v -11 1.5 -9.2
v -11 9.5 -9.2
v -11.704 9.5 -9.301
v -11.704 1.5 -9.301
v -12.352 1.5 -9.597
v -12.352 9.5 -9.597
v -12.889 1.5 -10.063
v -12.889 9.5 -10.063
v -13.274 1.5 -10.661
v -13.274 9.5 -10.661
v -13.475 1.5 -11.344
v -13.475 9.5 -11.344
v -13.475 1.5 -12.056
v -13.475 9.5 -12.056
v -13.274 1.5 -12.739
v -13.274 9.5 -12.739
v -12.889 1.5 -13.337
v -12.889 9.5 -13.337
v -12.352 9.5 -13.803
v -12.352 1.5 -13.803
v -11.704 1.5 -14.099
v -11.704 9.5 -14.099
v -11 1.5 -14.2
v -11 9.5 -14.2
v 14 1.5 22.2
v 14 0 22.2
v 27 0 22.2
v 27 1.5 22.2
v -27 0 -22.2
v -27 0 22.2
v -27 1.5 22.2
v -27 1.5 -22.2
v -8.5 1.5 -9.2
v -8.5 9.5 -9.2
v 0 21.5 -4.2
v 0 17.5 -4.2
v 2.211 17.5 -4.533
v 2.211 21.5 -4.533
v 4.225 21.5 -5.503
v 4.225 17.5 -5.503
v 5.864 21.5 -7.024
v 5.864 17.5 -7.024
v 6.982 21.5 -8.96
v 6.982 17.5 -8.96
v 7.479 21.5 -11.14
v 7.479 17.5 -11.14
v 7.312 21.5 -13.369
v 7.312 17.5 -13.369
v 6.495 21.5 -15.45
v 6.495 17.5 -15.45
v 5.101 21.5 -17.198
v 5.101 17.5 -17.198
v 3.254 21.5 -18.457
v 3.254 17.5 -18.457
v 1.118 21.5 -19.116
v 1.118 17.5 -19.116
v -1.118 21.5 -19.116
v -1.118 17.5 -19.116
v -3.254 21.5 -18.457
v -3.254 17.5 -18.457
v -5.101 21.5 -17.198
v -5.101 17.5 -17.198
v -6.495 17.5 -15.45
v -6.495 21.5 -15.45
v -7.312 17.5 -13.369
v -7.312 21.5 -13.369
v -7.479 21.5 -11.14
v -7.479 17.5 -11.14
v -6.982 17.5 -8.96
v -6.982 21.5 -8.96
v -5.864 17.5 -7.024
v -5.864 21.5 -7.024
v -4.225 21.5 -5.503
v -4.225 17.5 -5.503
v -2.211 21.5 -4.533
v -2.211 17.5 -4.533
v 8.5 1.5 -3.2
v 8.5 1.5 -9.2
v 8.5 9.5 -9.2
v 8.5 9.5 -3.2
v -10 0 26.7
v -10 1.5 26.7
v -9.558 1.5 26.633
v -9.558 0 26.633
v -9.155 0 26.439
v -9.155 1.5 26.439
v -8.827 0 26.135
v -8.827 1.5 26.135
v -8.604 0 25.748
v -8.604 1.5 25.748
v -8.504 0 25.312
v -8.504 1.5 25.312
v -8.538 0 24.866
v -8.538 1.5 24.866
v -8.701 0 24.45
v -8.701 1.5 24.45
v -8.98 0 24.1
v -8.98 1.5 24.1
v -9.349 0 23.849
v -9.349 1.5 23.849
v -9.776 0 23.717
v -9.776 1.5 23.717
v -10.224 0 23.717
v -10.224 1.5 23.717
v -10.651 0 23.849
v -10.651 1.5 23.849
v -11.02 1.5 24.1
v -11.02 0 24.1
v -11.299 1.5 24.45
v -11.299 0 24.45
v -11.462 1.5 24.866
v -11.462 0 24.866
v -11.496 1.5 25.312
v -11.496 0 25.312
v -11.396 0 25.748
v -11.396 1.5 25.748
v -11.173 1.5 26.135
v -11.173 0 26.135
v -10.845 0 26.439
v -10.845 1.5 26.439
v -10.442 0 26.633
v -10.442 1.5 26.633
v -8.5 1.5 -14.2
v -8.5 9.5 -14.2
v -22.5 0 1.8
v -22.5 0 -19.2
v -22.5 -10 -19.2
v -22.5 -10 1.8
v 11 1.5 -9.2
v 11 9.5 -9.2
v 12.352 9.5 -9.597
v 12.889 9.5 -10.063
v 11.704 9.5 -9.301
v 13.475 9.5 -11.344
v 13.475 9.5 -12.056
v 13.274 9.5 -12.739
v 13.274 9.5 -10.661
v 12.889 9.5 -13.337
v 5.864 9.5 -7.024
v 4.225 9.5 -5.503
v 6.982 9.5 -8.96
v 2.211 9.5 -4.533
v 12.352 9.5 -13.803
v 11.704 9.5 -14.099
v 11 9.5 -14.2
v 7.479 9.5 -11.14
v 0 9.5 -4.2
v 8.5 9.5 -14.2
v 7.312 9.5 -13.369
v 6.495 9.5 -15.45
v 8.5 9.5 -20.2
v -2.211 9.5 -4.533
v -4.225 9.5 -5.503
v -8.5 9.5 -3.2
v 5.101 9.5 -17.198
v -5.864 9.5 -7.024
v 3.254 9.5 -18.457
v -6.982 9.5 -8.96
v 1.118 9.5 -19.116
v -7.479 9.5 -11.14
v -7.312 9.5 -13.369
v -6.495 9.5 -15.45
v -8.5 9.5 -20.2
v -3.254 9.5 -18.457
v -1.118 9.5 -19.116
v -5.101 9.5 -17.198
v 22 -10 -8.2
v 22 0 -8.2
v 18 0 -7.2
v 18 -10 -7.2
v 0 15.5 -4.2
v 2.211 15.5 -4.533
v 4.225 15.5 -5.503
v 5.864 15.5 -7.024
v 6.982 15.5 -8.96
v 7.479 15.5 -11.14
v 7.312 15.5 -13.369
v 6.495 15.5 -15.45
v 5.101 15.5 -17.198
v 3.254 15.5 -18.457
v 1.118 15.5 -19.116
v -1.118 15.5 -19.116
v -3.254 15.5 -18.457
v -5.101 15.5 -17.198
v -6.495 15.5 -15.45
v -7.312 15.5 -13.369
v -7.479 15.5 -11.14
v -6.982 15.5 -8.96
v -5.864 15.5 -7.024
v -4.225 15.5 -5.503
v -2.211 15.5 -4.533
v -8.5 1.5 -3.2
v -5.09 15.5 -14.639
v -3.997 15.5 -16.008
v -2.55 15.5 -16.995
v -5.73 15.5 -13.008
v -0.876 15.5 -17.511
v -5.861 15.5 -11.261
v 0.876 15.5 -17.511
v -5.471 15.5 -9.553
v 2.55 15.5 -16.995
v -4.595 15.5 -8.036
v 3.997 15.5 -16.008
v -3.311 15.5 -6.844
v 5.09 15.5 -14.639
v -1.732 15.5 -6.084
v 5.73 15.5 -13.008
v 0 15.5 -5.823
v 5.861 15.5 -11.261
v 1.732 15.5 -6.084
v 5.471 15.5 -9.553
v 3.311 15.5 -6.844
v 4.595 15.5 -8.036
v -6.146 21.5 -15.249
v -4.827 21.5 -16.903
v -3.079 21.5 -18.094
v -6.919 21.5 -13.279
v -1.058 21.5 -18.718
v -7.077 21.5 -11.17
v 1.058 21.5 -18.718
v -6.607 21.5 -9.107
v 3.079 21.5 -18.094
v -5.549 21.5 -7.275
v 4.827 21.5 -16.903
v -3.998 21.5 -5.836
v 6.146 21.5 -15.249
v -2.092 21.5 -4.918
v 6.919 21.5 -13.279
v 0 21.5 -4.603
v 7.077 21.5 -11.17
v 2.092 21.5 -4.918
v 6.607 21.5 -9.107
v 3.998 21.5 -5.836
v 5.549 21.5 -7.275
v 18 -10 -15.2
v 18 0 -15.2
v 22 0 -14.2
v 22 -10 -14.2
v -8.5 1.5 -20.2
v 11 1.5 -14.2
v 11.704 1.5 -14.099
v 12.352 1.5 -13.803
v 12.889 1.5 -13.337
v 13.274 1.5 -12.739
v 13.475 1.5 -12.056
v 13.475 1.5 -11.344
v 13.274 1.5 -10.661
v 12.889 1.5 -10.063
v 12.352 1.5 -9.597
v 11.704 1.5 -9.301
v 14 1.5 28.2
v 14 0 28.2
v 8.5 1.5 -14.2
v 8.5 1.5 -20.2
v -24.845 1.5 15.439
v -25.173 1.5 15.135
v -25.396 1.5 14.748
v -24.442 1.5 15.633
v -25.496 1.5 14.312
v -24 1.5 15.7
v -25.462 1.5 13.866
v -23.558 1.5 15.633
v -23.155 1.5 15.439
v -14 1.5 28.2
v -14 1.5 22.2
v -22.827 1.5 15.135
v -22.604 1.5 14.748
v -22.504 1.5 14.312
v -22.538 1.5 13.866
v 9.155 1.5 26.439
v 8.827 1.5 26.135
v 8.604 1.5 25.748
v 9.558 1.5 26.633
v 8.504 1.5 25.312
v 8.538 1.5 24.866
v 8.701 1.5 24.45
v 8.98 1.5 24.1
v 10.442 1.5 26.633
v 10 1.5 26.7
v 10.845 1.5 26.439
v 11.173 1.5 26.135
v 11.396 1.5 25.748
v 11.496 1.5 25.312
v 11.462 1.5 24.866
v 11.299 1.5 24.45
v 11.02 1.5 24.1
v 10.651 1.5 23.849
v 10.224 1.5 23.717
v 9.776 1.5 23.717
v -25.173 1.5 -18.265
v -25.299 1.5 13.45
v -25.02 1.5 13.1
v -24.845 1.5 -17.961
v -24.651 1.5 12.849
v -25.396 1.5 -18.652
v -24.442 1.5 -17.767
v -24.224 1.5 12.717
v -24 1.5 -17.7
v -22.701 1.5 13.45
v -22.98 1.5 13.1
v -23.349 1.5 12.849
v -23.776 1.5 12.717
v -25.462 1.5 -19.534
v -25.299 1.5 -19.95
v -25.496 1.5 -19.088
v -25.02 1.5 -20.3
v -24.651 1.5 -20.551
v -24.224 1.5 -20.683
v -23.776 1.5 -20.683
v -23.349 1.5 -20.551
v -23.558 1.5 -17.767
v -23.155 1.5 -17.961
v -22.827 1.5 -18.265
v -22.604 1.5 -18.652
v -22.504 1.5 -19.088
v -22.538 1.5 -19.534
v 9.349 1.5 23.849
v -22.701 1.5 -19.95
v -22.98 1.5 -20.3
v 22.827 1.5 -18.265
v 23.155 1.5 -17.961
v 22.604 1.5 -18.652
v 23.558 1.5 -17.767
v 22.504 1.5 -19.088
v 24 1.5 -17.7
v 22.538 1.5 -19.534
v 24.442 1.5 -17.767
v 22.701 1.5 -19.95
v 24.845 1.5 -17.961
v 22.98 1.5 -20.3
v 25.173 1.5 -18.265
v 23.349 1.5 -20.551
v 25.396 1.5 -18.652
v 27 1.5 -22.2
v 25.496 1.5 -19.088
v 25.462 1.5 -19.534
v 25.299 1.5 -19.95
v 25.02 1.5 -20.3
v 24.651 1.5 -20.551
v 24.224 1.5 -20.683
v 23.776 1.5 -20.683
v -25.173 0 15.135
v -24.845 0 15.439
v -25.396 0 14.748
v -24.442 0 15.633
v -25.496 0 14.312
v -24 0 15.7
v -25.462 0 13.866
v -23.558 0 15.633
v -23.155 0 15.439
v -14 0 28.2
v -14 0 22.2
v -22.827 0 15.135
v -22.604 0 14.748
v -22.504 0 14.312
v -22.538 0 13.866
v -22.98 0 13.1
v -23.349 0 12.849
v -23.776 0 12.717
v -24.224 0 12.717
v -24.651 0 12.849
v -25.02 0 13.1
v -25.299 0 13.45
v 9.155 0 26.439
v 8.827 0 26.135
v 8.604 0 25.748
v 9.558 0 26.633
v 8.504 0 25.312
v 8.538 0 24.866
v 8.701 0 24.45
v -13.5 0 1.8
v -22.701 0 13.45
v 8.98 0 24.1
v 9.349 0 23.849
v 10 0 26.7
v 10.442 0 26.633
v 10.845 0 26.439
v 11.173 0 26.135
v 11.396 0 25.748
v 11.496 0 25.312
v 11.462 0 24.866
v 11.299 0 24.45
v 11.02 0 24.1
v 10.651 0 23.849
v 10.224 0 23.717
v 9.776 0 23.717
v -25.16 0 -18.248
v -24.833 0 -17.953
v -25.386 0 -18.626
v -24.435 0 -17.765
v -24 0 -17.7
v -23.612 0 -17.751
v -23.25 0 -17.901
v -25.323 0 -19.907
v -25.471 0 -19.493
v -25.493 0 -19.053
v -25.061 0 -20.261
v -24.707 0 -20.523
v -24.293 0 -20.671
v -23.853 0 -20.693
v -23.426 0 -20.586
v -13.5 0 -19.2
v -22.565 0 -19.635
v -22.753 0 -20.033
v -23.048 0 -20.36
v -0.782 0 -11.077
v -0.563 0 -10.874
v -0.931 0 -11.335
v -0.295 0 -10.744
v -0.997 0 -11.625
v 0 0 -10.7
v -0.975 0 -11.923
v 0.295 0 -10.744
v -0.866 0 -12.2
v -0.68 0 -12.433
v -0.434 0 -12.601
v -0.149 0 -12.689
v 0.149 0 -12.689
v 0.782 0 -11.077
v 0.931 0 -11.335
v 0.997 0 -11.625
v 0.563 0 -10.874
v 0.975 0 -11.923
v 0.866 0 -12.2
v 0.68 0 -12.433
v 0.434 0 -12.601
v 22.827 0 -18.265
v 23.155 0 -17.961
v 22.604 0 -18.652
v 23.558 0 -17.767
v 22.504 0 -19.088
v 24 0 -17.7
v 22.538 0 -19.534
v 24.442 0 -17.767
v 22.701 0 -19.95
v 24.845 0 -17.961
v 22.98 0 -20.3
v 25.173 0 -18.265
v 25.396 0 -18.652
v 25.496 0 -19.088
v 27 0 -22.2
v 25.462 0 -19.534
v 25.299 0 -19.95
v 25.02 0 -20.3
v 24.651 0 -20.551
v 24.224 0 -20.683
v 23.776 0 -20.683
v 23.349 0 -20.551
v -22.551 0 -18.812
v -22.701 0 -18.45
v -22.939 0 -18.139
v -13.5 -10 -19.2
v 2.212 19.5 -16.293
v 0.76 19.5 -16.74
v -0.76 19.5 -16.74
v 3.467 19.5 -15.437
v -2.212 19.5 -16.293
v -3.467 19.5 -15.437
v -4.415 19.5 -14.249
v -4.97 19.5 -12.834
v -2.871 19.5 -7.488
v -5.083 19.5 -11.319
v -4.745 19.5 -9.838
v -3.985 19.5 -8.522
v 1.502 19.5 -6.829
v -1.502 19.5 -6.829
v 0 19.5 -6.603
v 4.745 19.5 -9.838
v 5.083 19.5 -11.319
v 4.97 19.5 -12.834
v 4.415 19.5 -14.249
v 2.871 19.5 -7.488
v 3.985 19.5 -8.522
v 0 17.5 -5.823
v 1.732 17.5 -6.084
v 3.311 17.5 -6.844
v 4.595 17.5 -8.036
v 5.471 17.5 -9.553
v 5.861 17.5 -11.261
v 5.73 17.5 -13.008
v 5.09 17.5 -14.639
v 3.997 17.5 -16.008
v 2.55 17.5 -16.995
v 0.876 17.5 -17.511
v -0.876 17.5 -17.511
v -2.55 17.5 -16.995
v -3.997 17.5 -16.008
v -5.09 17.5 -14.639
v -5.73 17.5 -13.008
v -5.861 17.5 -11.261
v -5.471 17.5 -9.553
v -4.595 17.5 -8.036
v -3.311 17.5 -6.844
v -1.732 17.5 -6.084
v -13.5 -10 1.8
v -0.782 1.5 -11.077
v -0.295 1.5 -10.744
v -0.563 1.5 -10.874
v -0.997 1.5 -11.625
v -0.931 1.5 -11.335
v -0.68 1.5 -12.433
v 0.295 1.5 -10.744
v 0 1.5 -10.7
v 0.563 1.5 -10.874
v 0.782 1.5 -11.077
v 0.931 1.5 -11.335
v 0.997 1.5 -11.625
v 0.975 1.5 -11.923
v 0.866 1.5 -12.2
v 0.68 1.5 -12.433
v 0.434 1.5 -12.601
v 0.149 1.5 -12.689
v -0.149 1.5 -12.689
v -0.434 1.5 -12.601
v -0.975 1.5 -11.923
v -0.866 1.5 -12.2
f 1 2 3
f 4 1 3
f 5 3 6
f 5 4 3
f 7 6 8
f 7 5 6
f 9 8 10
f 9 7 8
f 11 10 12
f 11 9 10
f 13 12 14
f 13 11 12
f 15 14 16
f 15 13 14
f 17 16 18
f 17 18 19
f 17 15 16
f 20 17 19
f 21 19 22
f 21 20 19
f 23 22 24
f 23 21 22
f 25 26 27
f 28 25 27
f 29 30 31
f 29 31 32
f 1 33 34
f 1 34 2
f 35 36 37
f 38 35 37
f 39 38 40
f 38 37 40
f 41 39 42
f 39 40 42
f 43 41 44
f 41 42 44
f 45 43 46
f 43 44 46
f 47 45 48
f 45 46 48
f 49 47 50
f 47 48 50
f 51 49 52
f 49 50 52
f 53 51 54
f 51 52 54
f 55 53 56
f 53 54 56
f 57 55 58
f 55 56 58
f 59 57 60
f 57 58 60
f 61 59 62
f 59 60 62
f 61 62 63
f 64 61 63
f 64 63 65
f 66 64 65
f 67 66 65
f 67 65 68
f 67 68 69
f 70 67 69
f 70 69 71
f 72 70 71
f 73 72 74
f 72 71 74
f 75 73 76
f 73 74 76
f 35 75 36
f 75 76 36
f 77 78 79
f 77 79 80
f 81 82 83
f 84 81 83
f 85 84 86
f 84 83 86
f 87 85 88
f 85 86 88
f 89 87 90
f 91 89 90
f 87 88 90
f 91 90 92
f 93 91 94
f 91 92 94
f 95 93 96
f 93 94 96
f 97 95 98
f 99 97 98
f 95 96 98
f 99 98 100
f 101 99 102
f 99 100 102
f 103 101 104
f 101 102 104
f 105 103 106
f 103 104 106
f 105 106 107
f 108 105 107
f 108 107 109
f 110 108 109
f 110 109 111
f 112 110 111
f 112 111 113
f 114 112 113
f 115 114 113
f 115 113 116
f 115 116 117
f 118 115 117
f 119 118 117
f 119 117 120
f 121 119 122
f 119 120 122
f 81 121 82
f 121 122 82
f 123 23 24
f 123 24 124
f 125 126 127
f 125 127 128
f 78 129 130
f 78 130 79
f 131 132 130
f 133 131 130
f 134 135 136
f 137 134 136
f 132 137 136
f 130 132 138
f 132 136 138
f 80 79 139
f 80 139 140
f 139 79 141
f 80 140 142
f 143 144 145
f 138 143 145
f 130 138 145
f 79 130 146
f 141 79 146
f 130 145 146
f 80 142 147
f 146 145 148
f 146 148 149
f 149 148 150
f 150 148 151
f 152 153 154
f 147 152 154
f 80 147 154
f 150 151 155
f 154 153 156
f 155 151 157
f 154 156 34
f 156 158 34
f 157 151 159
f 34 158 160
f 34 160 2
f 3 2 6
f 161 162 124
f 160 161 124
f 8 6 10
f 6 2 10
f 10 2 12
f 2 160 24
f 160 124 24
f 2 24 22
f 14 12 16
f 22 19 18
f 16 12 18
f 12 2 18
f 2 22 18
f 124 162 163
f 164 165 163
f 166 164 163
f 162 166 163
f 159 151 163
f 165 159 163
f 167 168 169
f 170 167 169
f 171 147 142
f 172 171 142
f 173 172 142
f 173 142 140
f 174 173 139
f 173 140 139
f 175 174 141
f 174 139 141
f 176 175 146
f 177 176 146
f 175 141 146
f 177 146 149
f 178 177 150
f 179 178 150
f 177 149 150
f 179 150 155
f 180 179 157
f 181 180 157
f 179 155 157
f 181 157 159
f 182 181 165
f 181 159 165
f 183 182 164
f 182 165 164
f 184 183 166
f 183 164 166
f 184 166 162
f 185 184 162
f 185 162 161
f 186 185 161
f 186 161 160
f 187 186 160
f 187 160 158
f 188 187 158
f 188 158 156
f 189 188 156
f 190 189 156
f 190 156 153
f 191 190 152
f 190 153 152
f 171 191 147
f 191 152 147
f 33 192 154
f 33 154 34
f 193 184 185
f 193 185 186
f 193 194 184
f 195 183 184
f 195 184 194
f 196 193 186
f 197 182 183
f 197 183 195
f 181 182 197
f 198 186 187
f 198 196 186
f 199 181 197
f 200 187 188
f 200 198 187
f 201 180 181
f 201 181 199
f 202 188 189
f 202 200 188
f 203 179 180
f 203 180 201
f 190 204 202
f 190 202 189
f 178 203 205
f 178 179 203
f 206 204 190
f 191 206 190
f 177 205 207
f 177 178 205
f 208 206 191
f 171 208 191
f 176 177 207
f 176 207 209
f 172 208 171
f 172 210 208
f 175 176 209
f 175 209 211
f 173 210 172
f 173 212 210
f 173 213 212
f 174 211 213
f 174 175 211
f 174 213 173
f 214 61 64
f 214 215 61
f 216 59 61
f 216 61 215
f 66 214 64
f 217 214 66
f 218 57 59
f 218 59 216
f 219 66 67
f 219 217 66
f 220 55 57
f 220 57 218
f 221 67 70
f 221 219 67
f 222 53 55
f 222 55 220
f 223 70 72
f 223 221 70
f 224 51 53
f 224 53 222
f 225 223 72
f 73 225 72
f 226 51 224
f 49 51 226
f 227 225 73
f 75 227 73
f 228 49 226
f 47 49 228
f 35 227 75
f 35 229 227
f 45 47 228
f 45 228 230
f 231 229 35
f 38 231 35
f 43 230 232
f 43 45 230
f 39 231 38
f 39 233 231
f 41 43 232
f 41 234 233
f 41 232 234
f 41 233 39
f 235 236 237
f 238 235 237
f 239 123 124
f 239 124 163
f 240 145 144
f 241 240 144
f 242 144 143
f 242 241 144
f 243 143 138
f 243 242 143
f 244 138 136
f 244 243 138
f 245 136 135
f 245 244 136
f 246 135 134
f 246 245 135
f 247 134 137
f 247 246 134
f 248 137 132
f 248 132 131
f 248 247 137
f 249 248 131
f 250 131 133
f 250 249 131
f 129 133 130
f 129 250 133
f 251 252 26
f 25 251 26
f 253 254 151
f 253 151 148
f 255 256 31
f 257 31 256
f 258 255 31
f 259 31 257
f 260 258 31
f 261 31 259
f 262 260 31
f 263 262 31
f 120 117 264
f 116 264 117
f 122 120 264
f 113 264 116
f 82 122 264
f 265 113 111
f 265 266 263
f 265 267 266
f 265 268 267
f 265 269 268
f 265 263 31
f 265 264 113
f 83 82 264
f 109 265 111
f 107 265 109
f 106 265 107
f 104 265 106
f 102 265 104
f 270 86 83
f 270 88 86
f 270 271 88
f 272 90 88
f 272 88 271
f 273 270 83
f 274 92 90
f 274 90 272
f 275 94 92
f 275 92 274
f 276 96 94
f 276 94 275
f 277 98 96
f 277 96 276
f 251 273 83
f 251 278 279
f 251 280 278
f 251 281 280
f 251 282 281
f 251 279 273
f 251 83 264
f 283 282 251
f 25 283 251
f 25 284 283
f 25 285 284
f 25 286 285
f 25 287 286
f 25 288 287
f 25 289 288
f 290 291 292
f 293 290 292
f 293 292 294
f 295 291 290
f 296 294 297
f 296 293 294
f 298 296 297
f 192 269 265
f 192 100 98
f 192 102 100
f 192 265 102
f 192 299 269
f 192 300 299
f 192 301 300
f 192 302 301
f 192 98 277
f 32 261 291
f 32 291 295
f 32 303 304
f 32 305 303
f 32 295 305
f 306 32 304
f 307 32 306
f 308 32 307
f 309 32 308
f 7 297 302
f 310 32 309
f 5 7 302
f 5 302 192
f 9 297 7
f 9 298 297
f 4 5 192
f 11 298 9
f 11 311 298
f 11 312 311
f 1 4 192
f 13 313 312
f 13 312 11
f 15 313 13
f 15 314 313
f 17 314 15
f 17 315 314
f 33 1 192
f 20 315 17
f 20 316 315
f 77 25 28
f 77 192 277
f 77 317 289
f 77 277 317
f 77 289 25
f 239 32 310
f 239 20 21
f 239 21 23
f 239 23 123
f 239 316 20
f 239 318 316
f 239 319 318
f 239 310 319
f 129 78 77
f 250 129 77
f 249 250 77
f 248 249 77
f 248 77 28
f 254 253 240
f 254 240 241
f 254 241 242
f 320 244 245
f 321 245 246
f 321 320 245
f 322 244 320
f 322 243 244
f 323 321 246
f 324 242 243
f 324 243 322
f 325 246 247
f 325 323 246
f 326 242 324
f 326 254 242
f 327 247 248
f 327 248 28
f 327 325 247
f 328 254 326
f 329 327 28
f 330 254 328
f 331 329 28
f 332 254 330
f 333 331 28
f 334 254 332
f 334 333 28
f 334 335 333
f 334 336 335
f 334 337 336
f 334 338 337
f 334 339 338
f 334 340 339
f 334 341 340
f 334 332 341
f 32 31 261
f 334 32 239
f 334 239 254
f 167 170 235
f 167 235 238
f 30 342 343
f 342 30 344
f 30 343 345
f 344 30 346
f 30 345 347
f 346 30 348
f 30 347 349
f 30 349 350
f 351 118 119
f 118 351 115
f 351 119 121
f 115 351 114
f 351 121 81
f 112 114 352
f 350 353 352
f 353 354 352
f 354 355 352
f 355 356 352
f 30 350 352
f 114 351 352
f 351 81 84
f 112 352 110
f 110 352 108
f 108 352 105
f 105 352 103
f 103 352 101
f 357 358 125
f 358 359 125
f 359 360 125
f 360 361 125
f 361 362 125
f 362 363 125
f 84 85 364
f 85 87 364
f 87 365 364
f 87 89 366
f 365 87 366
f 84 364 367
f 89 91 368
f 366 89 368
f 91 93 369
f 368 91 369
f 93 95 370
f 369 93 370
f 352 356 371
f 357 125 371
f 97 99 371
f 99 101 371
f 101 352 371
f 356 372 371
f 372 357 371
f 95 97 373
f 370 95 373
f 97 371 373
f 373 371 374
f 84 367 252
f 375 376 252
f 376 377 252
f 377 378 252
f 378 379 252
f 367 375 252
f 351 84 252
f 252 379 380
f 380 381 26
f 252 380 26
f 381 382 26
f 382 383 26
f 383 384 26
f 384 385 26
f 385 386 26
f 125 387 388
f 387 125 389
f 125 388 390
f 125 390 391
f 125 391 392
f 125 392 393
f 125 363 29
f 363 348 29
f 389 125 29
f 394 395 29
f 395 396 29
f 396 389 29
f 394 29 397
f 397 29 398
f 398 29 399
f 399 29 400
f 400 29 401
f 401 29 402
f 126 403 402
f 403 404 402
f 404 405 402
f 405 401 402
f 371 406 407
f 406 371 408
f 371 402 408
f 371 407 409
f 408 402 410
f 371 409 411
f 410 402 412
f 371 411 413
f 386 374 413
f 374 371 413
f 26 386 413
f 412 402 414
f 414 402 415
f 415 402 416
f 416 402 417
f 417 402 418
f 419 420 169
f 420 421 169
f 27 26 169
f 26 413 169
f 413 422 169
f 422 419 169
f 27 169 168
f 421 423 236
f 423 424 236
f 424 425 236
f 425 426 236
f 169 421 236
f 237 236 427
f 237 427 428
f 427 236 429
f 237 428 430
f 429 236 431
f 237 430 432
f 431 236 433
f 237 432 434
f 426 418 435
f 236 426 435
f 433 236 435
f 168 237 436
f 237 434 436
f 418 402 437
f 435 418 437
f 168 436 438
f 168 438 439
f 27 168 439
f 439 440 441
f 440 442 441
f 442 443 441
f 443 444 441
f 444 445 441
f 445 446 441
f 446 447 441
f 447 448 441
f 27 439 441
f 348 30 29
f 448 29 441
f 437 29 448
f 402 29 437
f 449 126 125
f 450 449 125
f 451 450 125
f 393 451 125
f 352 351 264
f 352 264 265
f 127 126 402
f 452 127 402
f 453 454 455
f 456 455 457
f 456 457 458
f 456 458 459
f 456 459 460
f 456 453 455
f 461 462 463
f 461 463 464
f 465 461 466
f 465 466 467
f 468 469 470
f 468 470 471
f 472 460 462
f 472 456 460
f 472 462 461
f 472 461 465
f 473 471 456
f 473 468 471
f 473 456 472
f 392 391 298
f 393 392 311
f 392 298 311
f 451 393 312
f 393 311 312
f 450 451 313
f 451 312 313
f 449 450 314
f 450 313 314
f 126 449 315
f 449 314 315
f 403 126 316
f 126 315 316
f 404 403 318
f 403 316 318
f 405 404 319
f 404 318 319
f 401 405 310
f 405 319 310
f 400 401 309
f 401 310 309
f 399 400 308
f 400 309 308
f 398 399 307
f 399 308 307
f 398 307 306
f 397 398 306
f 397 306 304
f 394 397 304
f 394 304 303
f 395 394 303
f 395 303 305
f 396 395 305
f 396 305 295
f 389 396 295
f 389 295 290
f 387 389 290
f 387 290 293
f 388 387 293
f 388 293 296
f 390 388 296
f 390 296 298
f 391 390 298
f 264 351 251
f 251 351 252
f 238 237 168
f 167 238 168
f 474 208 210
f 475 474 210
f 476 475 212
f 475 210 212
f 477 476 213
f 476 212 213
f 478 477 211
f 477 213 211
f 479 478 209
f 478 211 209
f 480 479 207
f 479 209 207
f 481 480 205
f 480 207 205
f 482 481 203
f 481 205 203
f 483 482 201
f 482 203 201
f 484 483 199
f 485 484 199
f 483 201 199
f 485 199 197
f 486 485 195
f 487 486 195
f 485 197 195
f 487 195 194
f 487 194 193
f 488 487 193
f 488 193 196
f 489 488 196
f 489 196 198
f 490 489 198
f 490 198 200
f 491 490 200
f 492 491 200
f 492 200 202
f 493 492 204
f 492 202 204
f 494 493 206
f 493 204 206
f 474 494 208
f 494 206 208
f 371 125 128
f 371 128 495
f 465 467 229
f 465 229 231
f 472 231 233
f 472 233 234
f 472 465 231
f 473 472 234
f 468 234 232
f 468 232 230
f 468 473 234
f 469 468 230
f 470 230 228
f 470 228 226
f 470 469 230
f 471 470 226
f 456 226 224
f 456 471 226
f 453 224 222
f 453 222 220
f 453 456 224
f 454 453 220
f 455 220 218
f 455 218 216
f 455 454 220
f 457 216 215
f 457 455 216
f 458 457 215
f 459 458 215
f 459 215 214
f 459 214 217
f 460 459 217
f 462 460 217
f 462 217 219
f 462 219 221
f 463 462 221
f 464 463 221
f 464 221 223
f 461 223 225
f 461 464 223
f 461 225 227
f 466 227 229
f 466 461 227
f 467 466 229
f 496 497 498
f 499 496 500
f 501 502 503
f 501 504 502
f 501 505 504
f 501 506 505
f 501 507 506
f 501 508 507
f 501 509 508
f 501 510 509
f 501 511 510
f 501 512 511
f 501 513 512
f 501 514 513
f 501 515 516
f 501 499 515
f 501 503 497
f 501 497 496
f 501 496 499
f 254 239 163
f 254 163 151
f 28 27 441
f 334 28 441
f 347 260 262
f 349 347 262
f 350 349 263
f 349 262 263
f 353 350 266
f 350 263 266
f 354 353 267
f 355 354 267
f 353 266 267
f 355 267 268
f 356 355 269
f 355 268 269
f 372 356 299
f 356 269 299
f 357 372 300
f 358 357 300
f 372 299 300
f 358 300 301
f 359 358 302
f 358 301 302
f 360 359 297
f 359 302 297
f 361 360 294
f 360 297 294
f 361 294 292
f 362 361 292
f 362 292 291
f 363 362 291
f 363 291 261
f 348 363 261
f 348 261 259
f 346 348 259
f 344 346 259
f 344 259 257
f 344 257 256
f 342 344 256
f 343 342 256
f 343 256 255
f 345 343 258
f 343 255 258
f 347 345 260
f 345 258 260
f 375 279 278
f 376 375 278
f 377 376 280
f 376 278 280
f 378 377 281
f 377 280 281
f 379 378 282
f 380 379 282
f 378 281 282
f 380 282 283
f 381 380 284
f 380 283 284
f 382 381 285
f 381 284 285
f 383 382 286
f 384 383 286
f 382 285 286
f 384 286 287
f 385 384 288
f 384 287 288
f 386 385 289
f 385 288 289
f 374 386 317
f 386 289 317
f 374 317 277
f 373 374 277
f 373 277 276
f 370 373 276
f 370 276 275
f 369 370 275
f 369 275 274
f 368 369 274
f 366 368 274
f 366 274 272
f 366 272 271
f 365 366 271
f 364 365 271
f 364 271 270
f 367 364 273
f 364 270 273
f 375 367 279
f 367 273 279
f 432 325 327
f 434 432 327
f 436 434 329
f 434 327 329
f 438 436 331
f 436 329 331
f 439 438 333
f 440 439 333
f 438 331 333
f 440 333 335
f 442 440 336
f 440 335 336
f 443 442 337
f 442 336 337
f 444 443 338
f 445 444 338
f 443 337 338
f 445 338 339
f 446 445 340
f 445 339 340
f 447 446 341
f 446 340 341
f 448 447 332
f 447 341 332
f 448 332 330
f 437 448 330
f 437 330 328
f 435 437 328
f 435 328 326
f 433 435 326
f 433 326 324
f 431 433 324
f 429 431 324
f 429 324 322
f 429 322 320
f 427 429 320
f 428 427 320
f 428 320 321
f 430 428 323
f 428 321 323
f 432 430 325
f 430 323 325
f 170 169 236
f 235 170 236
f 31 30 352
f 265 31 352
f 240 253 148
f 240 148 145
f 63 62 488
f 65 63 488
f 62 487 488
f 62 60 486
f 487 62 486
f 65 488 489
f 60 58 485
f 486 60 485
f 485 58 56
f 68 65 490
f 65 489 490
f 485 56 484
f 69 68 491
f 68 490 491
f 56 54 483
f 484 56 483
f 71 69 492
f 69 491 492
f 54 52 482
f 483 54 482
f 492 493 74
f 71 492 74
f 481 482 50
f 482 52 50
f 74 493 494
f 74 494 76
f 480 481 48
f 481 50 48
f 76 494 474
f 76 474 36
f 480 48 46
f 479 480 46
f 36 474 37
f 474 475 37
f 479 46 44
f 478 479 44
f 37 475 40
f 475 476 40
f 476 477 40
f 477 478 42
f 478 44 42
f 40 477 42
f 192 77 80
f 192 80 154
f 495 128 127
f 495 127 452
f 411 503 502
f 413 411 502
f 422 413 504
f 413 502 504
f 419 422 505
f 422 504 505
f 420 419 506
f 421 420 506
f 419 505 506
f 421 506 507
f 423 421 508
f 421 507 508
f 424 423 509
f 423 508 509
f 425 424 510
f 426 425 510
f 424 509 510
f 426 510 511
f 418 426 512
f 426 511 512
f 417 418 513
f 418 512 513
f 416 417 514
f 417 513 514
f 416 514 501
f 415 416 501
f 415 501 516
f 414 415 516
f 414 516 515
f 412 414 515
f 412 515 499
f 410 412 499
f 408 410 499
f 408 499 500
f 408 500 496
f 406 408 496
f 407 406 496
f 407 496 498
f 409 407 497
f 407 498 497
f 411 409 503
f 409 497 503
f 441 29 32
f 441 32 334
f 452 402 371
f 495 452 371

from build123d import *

# Parameters (mm, degrees)
SKETCH1_W           = 54
SKETCH1_H           = 44.4
SKETCH1_W_2         = 28
SKETCH1_H_2         = 6
BOSS_EXTRUDE1_DEPTH = 1.5
SKETCH2_R           = 1.5
SKETCH2_R_2         = 1
CUT_EXTRUDE1_DEPTH  = 1.5
BOSS_EXTRUDE2_DEPTH = 8
SKETCH4_R           = 7.5
BOSS_EXTRUDE3_DEPTH = 6
SKETCH5_R           = 5.877121991
BOSS_EXTRUDE4_DEPTH = 2
SKETCH6_R           = 7.5
BOSS_EXTRUDE5_DEPTH = 4
SKETCH7_R           = 5.097427656
CUT_EXTRUDE3_DEPTH  = 2
CHAMFER1_SIZE       = 2
BOSS_EXTRUDE6_DEPTH = 10
SKETCH9_W           = 9
SKETCH9_H           = 21
BOSS_EXTRUDE7_DEPTH = 10


with BuildPart() as part:
    # Sketch1 → Boss-Extrude1 (new body)
    with BuildSketch(Plane(origin=(0, 0, 0), x_dir=(1, 0, 0), z_dir=(0, 1, 0))):
        Rectangle(SKETCH1_W, SKETCH1_H)
        with Locations((0, -25.2)):
            Rectangle(SKETCH1_W_2, SKETCH1_H_2)
    extrude(amount=BOSS_EXTRUDE1_DEPTH)

    # Sketch2 → Cut-Extrude1 (cut)
    with BuildSketch(Plane(origin=(0, 1.5, 0), x_dir=(1, 0, 0), z_dir=(0, 1, 0))):
        with Locations(Location((-24, 19.2, 0), (0, 0, 270))):
            Circle(SKETCH2_R)
        with Locations(Location((24, 19.2, 0), (0, 0, 270))):
            Circle(SKETCH2_R)
        with Locations(Location((-24, -14.2, 0), (0, 0, 270))):
            Circle(SKETCH2_R)
        with Locations(Location((-10, -25.2, 0), (0, 0, 270))):
            Circle(SKETCH2_R)
        with Locations(Location((10, -25.2, 0), (0, 0, 270))):
            Circle(SKETCH2_R)
        with Locations(Location((0, 11.7, 0), (0, 0, 270))):
            Circle(SKETCH2_R_2)
    extrude(amount=-CUT_EXTRUDE1_DEPTH, mode=Mode.SUBTRACT)

    # Sketch3 → Boss-Extrude2 (add)
    with BuildSketch(Plane(origin=(0, 1.5, 0), x_dir=(1, 0, 0), z_dir=(0, 1, 0))):
        with BuildLine():
            Line((-8.5, 20.2), (8.5, 20.2))
            Line((8.5, 20.2), (8.5, 14.2))
            Line((8.5, 14.2), (11, 14.2))
            ThreePointArc((11, 14.2), (13.5, 11.7), (11, 9.2))
            Line((11, 9.2), (8.5, 9.2))
            Line((8.5, 9.2), (8.5, 3.2))
            Line((8.5, 3.2), (-8.5, 3.2))
            Line((-8.5, 3.2), (-8.5, 9.2))
            Line((-8.5, 9.2), (-11, 9.2))
            ThreePointArc((-11, 9.2), (-13.5, 11.7), (-11, 14.2))
            Line((-11, 14.2), (-8.5, 14.2))
            Line((-8.5, 14.2), (-8.5, 20.2))
        make_face()
    extrude(amount=BOSS_EXTRUDE2_DEPTH)

    # Sketch4 → Boss-Extrude3 (add)
    with BuildSketch(Plane(origin=(0, 9.5, 0), x_dir=(1, 0, 0), z_dir=(0, 1, 0))):
        with Locations(Location((0, 11.7, 0), (0, 0, 270))):
            Circle(SKETCH4_R)
    extrude(amount=BOSS_EXTRUDE3_DEPTH)

    # Sketch5 → Boss-Extrude4 (add)
    with BuildSketch(Plane(origin=(0, 15.5, 0), x_dir=(1, 0, 0), z_dir=(0, 1, 0))):
        with Locations(Location((0, 11.7, 0), (0, 0, 270))):
            Circle(SKETCH5_R)
    extrude(amount=BOSS_EXTRUDE4_DEPTH)

    # Sketch6 → Boss-Extrude5 (add)
    with BuildSketch(Plane(origin=(0, 17.5, 0), x_dir=(1, 0, 0), z_dir=(0, 1, 0))):
        with Locations(Location((0, 11.7, 0), (0, 0, 270))):
            Circle(SKETCH6_R)
    extrude(amount=BOSS_EXTRUDE5_DEPTH)

    # Sketch7 → Cut-Extrude3 (cut)
    with BuildSketch(Plane(origin=(0, 21.5, 0), x_dir=(1, 0, 0), z_dir=(0, 1, 0))):
        with Locations(Location((0, 11.7, 0), (0, 0, 270))):
            Circle(SKETCH7_R)
    extrude(amount=-CUT_EXTRUDE3_DEPTH, mode=Mode.SUBTRACT)

    # Chamfer1
    chamfer1_edges = [part.edges().sort_by_distance(p)[0] for p in [
        (0, 21.5, -16.797427656),
    ]]
    chamfer(chamfer1_edges, length=CHAMFER1_SIZE - 0.0001)  # a hair under: the kernel refuses the full size

    # Sketch8 → Boss-Extrude6 (add)
    with BuildSketch(Plane.XZ):
        Polygon((18, -7.2), (18, -15.2), (22, -14.2), (22, -8.2), align=None)
    extrude(amount=BOSS_EXTRUDE6_DEPTH)

    # Sketch9 → Boss-Extrude7 (add)
    with BuildSketch(Plane.XZ):
        with Locations((-18, -8.7)):
            Rectangle(SKETCH9_W, SKETCH9_H)
    extrude(amount=BOSS_EXTRUDE7_DEPTH)


solid = part.part
